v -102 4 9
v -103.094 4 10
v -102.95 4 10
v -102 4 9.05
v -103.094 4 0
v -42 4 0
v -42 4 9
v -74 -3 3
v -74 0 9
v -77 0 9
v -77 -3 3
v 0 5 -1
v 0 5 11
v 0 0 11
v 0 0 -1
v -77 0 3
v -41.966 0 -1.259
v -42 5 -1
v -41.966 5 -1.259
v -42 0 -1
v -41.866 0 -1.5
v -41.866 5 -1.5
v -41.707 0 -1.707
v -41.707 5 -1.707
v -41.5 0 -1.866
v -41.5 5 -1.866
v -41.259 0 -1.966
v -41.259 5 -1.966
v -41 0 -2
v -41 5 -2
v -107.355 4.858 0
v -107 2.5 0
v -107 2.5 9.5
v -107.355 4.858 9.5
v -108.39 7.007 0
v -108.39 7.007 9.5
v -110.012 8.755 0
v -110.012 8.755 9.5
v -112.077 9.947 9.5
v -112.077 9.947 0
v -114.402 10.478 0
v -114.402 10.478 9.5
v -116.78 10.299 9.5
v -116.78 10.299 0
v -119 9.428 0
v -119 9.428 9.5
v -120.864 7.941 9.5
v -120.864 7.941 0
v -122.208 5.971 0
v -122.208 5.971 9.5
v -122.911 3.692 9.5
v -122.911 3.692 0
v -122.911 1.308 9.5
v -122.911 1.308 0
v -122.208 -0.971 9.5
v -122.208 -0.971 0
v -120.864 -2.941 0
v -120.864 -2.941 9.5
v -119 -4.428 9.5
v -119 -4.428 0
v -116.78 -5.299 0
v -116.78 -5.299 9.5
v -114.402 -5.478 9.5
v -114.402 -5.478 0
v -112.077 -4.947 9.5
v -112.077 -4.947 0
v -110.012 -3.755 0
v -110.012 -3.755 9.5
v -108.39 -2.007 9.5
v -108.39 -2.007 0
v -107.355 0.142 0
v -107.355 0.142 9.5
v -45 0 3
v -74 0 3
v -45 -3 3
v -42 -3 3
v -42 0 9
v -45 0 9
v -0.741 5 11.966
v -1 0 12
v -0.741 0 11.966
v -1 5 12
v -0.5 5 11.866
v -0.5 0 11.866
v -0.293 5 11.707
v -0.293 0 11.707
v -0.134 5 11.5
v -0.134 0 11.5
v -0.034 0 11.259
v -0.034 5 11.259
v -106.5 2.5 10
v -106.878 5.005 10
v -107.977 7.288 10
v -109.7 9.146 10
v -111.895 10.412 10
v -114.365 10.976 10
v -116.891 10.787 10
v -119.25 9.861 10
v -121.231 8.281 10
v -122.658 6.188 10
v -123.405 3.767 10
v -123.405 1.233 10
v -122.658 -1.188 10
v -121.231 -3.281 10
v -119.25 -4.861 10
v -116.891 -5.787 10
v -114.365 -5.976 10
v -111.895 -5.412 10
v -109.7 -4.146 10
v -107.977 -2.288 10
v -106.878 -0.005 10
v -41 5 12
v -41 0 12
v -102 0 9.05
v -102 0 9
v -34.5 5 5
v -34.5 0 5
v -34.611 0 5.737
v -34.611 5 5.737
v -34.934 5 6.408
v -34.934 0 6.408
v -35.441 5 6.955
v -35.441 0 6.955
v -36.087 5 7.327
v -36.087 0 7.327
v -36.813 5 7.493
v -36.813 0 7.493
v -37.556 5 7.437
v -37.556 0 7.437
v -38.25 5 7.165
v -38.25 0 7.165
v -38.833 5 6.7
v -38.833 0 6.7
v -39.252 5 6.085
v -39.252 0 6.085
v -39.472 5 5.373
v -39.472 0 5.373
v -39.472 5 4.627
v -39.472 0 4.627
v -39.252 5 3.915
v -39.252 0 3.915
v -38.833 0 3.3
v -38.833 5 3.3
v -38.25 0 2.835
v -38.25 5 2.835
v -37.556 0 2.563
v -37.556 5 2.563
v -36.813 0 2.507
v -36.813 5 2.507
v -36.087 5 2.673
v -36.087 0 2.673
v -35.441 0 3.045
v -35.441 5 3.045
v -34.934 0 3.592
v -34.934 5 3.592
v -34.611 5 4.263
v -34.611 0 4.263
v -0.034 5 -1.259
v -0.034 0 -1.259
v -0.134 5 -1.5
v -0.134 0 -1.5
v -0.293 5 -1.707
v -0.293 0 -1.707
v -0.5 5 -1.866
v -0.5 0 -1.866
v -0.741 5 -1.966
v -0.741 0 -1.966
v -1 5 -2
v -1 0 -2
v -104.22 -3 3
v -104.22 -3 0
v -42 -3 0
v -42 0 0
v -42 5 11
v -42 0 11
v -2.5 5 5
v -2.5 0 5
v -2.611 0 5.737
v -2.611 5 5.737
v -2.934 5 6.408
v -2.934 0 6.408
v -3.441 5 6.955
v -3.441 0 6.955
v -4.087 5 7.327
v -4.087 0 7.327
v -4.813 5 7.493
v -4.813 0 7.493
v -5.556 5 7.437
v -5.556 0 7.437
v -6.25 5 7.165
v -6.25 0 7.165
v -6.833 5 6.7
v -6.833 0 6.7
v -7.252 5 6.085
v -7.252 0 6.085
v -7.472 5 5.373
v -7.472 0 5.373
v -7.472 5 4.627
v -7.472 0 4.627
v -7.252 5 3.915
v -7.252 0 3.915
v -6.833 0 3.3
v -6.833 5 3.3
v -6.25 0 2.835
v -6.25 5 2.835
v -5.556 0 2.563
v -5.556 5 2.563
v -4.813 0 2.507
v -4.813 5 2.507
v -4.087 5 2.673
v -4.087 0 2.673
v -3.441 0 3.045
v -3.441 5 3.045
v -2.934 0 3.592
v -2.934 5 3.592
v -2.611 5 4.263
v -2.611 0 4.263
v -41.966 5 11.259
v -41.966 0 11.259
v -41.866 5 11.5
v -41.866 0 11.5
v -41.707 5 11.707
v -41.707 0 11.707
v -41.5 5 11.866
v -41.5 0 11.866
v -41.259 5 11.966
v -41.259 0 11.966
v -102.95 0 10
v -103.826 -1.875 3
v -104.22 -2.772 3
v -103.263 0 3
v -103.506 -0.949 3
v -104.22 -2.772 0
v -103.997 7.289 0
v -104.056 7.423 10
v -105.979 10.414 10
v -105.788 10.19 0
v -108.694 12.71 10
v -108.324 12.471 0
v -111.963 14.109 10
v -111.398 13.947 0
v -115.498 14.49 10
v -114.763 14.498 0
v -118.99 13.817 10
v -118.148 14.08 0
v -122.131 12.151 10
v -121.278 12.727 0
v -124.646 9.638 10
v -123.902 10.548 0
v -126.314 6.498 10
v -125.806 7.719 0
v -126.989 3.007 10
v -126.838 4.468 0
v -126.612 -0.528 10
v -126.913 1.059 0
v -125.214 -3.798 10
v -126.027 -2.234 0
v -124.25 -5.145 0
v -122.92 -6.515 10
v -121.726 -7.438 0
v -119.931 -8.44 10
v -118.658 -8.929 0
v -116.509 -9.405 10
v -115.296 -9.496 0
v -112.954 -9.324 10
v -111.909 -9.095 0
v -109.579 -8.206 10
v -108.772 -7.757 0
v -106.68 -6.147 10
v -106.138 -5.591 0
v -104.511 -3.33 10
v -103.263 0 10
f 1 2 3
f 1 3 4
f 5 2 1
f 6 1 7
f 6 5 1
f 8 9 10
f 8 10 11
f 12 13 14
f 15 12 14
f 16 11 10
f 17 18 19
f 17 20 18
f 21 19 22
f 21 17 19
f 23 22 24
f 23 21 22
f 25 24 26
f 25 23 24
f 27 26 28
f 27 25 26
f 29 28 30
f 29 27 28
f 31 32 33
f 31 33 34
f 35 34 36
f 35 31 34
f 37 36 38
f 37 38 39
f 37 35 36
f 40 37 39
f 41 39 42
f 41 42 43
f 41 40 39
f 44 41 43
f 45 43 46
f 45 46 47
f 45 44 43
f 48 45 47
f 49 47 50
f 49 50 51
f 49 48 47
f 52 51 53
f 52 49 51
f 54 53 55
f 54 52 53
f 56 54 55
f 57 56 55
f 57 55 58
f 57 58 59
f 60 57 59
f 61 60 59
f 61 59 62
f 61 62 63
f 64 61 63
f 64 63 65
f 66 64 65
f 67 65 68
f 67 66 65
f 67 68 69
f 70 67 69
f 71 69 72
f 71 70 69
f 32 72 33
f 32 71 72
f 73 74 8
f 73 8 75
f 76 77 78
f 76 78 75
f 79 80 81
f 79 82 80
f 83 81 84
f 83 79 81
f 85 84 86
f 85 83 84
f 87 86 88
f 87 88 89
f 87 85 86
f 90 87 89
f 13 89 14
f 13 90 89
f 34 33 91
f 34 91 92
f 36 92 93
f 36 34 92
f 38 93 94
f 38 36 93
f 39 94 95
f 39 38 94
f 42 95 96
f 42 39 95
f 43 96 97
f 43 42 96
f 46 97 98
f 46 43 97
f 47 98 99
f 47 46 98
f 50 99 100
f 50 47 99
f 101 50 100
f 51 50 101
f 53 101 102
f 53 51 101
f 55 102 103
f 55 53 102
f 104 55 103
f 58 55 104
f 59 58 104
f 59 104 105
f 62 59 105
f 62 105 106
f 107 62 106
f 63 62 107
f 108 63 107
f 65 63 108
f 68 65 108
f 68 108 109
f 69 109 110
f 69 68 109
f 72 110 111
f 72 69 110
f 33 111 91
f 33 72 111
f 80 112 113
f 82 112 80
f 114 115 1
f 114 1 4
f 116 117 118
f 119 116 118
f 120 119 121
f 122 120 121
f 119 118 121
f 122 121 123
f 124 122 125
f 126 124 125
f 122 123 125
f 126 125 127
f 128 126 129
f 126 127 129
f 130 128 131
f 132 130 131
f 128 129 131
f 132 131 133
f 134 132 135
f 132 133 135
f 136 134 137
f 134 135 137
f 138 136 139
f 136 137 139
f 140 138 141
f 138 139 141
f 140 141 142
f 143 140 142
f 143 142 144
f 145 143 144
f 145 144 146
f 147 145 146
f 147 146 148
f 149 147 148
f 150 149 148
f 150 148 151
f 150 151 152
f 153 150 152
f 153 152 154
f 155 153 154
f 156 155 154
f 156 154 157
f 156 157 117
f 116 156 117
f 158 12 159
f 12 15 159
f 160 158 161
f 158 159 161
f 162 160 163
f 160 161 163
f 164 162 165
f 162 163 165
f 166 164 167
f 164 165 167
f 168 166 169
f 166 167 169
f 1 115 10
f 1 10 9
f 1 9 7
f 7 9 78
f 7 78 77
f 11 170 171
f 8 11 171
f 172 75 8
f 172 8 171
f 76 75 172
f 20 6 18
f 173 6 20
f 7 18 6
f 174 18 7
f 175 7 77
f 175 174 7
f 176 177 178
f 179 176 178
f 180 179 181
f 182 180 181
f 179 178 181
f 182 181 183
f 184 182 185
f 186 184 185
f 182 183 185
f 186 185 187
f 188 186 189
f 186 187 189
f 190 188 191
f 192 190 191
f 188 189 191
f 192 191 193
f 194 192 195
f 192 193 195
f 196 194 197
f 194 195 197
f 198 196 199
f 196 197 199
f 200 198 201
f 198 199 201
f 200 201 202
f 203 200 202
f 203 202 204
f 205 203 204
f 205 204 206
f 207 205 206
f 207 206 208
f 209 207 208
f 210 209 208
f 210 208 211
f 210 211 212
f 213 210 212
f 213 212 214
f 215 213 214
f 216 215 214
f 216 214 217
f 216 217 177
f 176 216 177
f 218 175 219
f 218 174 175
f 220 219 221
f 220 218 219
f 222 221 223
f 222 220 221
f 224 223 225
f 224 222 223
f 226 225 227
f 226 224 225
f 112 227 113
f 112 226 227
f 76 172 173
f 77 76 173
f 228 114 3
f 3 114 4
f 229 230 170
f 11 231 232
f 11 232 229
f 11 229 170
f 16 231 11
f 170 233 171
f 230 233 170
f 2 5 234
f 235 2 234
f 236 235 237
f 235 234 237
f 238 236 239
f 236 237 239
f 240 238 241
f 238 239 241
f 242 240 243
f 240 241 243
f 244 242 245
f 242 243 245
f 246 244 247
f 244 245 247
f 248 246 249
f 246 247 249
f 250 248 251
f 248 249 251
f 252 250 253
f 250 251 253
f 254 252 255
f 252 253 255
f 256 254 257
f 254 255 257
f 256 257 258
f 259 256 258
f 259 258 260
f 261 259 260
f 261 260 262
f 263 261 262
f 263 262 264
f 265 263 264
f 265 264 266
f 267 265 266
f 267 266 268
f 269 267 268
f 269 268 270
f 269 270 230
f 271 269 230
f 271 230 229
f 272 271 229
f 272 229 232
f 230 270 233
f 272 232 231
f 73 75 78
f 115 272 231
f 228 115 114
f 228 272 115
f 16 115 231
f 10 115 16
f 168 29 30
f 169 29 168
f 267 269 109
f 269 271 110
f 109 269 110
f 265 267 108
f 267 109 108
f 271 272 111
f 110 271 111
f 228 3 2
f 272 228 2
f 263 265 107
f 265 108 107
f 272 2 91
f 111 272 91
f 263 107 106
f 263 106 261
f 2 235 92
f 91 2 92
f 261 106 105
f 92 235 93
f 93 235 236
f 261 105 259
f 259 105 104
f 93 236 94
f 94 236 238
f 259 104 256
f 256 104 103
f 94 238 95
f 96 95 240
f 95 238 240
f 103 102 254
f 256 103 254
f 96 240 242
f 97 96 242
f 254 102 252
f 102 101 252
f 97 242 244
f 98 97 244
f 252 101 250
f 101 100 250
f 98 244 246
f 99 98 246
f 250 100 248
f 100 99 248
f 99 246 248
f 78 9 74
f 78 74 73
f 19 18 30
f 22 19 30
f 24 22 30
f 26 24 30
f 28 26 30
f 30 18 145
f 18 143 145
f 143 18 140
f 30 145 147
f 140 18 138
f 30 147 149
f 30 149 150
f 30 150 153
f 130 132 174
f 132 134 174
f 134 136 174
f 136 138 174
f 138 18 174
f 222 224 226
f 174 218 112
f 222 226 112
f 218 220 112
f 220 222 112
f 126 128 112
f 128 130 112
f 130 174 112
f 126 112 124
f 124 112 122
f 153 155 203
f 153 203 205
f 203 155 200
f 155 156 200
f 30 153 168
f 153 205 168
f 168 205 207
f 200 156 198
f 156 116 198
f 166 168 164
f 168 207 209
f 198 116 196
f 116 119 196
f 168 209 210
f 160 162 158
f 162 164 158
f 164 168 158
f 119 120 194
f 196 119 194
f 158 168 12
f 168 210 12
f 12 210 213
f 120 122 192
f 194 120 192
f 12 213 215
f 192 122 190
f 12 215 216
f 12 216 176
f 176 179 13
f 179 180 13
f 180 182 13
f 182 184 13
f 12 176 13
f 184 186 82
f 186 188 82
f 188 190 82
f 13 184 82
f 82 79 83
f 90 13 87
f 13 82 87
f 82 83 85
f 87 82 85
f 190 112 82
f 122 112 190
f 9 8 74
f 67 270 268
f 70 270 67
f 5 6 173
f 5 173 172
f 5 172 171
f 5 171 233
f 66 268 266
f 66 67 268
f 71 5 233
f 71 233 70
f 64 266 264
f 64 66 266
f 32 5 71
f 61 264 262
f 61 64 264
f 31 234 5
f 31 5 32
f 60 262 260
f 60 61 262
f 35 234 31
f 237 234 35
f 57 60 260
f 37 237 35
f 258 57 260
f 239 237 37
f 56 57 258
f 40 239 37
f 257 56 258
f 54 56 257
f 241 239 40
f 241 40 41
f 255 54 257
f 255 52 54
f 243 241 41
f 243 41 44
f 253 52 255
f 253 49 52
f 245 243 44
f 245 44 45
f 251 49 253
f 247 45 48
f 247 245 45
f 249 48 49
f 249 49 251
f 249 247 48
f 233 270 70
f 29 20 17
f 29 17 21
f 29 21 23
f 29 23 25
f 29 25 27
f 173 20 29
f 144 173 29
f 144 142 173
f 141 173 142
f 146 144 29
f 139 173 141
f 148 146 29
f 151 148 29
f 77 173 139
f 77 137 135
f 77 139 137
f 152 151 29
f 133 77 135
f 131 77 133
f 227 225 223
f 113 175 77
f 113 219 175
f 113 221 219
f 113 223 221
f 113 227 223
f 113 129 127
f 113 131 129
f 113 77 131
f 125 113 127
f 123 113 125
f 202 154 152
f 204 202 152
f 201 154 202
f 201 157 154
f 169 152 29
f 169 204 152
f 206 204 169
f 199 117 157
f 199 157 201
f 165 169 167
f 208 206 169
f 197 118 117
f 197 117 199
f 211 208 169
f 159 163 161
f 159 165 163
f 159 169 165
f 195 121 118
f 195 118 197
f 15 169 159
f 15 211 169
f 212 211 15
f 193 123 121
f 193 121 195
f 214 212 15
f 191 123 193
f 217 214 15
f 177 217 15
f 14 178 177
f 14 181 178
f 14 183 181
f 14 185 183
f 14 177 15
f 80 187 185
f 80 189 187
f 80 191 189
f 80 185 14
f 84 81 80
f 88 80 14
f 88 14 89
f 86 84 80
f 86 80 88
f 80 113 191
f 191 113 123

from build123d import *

# Parameters (mm, degrees)
SKETCH_R        = 8
PAD_DEPTH       = 10
SKETCH001_R     = 2.5
POCKET_DEPTH    = 14.501
SKETCH002_W     = 42
SKETCH002_H     = 5
PAD001_DEPTH    = 2
SKETCH003_W     = 42
SKETCH003_H     = 5
PAD002_DEPTH    = 2
SKETCH004_W     = 62.22
SKETCH004_H     = 3
PAD003_DEPTH    = 3
PAD004_DEPTH    = 3
PAD005_DEPTH    = 3
FILLET_R        = 1
SKETCH007_W     = 60
SKETCH007_H     = 1
POCKET001_DEPTH = 14.501
CHAMFER_SIZE    = 0.95
CHAMFER001_SIZE = 0.5


with BuildPart() as part:
    # Sketch → Pad (new body)
    with BuildSketch(Plane.XY):
        with BuildLine():
            Line((0, 0), (-103.263305, 0))
            ThreePointArc((-103.094119, 4), (-126.98928, 3.007106), (-103.263305, 0))
            Line((-103.094119, 4), (-42, 4))
            Line((-42, 4), (-42, 5))
            Line((-42, 5), (0, 5))
            Line((0, 5), (0, 0))
        make_face()
        with Locations((-115, 2.5)):
            Circle(SKETCH_R, mode=Mode.SUBTRACT)
    extrude(amount=PAD_DEPTH)

    # Sketch001 (on Face1 of Pad) → Pocket (cut, through all)
    with BuildSketch(Plane.XZ):
        with Locations((-37, 5)):
            Circle(SKETCH001_R)
        with Locations((-5, 5)):
            Circle(SKETCH001_R)
    extrude(amount=-POCKET_DEPTH, mode=Mode.SUBTRACT)

    # Sketch002 (on Face4 of Pocket) → Pad001 (join)
    with BuildSketch(Plane.XY.offset(10)):
        with Locations((-21, 2.5)):
            Rectangle(SKETCH002_W, SKETCH002_H)
    extrude(amount=PAD001_DEPTH)

    # Sketch003 (on Face3 of Pad001) → Pad002 (join)
    with BuildSketch(Plane(origin=(0, 0, 0), x_dir=(1, 0, 0), z_dir=(0, 0, -1))):
        with Locations((-21, -2.5)):
            Rectangle(SKETCH003_W, SKETCH003_H)
    extrude(amount=PAD002_DEPTH)

    # Sketch004 → Pad003 (join)
    with BuildSketch(Plane.XZ):
        with Locations((-73.11, 1.5)):
            Rectangle(SKETCH004_W, SKETCH004_H)
    extrude(amount=PAD003_DEPTH)

    # Sketch005 → Pad004 (join)
    with BuildSketch(Plane.YZ.offset(-42)):
        Polygon((-3, 3), (0, 3), (0, 9), align=None)
    extrude(amount=-PAD004_DEPTH)

    # Sketch006 → Pad005 (join)
    with BuildSketch(Plane.YZ.offset(-74)):
        Polygon((-3, 3), (0, 3), (0, 9), align=None)
    extrude(amount=-PAD005_DEPTH)

    # Fillet
    fillet_edges = [part.edges().sort_by_distance(p)[0] for p in [
        (0, 2.5, -2),
        (0, 2.5, 12),
        (-42, 2.5, 12),
        (-42, 2.5, -2),
    ]]
    fillet(fillet_edges, radius=FILLET_R)

    # Sketch007 (on Face4 of Fillet) → Pocket001 (cut, through all)
    with BuildSketch(Plane.XZ):
        with Locations((-72, 9.5)):
            Rectangle(SKETCH007_W, SKETCH007_H)
    extrude(amount=-POCKET001_DEPTH, mode=Mode.SUBTRACT)

    # Chamfer
    chamfer_edges = [part.edges().sort_by_distance(p)[0] for p in [
        (-102, 2, 10),
    ]]
    chamfer(chamfer_edges, length=CHAMFER_SIZE)

    # Chamfer001
    chamfer001_edges = [part.edges().sort_by_distance(p)[0] for p in [
        (-123, 2.5, 10),
    ]]
    chamfer(chamfer001_edges, length=CHAMFER001_SIZE)


solid = part.part
